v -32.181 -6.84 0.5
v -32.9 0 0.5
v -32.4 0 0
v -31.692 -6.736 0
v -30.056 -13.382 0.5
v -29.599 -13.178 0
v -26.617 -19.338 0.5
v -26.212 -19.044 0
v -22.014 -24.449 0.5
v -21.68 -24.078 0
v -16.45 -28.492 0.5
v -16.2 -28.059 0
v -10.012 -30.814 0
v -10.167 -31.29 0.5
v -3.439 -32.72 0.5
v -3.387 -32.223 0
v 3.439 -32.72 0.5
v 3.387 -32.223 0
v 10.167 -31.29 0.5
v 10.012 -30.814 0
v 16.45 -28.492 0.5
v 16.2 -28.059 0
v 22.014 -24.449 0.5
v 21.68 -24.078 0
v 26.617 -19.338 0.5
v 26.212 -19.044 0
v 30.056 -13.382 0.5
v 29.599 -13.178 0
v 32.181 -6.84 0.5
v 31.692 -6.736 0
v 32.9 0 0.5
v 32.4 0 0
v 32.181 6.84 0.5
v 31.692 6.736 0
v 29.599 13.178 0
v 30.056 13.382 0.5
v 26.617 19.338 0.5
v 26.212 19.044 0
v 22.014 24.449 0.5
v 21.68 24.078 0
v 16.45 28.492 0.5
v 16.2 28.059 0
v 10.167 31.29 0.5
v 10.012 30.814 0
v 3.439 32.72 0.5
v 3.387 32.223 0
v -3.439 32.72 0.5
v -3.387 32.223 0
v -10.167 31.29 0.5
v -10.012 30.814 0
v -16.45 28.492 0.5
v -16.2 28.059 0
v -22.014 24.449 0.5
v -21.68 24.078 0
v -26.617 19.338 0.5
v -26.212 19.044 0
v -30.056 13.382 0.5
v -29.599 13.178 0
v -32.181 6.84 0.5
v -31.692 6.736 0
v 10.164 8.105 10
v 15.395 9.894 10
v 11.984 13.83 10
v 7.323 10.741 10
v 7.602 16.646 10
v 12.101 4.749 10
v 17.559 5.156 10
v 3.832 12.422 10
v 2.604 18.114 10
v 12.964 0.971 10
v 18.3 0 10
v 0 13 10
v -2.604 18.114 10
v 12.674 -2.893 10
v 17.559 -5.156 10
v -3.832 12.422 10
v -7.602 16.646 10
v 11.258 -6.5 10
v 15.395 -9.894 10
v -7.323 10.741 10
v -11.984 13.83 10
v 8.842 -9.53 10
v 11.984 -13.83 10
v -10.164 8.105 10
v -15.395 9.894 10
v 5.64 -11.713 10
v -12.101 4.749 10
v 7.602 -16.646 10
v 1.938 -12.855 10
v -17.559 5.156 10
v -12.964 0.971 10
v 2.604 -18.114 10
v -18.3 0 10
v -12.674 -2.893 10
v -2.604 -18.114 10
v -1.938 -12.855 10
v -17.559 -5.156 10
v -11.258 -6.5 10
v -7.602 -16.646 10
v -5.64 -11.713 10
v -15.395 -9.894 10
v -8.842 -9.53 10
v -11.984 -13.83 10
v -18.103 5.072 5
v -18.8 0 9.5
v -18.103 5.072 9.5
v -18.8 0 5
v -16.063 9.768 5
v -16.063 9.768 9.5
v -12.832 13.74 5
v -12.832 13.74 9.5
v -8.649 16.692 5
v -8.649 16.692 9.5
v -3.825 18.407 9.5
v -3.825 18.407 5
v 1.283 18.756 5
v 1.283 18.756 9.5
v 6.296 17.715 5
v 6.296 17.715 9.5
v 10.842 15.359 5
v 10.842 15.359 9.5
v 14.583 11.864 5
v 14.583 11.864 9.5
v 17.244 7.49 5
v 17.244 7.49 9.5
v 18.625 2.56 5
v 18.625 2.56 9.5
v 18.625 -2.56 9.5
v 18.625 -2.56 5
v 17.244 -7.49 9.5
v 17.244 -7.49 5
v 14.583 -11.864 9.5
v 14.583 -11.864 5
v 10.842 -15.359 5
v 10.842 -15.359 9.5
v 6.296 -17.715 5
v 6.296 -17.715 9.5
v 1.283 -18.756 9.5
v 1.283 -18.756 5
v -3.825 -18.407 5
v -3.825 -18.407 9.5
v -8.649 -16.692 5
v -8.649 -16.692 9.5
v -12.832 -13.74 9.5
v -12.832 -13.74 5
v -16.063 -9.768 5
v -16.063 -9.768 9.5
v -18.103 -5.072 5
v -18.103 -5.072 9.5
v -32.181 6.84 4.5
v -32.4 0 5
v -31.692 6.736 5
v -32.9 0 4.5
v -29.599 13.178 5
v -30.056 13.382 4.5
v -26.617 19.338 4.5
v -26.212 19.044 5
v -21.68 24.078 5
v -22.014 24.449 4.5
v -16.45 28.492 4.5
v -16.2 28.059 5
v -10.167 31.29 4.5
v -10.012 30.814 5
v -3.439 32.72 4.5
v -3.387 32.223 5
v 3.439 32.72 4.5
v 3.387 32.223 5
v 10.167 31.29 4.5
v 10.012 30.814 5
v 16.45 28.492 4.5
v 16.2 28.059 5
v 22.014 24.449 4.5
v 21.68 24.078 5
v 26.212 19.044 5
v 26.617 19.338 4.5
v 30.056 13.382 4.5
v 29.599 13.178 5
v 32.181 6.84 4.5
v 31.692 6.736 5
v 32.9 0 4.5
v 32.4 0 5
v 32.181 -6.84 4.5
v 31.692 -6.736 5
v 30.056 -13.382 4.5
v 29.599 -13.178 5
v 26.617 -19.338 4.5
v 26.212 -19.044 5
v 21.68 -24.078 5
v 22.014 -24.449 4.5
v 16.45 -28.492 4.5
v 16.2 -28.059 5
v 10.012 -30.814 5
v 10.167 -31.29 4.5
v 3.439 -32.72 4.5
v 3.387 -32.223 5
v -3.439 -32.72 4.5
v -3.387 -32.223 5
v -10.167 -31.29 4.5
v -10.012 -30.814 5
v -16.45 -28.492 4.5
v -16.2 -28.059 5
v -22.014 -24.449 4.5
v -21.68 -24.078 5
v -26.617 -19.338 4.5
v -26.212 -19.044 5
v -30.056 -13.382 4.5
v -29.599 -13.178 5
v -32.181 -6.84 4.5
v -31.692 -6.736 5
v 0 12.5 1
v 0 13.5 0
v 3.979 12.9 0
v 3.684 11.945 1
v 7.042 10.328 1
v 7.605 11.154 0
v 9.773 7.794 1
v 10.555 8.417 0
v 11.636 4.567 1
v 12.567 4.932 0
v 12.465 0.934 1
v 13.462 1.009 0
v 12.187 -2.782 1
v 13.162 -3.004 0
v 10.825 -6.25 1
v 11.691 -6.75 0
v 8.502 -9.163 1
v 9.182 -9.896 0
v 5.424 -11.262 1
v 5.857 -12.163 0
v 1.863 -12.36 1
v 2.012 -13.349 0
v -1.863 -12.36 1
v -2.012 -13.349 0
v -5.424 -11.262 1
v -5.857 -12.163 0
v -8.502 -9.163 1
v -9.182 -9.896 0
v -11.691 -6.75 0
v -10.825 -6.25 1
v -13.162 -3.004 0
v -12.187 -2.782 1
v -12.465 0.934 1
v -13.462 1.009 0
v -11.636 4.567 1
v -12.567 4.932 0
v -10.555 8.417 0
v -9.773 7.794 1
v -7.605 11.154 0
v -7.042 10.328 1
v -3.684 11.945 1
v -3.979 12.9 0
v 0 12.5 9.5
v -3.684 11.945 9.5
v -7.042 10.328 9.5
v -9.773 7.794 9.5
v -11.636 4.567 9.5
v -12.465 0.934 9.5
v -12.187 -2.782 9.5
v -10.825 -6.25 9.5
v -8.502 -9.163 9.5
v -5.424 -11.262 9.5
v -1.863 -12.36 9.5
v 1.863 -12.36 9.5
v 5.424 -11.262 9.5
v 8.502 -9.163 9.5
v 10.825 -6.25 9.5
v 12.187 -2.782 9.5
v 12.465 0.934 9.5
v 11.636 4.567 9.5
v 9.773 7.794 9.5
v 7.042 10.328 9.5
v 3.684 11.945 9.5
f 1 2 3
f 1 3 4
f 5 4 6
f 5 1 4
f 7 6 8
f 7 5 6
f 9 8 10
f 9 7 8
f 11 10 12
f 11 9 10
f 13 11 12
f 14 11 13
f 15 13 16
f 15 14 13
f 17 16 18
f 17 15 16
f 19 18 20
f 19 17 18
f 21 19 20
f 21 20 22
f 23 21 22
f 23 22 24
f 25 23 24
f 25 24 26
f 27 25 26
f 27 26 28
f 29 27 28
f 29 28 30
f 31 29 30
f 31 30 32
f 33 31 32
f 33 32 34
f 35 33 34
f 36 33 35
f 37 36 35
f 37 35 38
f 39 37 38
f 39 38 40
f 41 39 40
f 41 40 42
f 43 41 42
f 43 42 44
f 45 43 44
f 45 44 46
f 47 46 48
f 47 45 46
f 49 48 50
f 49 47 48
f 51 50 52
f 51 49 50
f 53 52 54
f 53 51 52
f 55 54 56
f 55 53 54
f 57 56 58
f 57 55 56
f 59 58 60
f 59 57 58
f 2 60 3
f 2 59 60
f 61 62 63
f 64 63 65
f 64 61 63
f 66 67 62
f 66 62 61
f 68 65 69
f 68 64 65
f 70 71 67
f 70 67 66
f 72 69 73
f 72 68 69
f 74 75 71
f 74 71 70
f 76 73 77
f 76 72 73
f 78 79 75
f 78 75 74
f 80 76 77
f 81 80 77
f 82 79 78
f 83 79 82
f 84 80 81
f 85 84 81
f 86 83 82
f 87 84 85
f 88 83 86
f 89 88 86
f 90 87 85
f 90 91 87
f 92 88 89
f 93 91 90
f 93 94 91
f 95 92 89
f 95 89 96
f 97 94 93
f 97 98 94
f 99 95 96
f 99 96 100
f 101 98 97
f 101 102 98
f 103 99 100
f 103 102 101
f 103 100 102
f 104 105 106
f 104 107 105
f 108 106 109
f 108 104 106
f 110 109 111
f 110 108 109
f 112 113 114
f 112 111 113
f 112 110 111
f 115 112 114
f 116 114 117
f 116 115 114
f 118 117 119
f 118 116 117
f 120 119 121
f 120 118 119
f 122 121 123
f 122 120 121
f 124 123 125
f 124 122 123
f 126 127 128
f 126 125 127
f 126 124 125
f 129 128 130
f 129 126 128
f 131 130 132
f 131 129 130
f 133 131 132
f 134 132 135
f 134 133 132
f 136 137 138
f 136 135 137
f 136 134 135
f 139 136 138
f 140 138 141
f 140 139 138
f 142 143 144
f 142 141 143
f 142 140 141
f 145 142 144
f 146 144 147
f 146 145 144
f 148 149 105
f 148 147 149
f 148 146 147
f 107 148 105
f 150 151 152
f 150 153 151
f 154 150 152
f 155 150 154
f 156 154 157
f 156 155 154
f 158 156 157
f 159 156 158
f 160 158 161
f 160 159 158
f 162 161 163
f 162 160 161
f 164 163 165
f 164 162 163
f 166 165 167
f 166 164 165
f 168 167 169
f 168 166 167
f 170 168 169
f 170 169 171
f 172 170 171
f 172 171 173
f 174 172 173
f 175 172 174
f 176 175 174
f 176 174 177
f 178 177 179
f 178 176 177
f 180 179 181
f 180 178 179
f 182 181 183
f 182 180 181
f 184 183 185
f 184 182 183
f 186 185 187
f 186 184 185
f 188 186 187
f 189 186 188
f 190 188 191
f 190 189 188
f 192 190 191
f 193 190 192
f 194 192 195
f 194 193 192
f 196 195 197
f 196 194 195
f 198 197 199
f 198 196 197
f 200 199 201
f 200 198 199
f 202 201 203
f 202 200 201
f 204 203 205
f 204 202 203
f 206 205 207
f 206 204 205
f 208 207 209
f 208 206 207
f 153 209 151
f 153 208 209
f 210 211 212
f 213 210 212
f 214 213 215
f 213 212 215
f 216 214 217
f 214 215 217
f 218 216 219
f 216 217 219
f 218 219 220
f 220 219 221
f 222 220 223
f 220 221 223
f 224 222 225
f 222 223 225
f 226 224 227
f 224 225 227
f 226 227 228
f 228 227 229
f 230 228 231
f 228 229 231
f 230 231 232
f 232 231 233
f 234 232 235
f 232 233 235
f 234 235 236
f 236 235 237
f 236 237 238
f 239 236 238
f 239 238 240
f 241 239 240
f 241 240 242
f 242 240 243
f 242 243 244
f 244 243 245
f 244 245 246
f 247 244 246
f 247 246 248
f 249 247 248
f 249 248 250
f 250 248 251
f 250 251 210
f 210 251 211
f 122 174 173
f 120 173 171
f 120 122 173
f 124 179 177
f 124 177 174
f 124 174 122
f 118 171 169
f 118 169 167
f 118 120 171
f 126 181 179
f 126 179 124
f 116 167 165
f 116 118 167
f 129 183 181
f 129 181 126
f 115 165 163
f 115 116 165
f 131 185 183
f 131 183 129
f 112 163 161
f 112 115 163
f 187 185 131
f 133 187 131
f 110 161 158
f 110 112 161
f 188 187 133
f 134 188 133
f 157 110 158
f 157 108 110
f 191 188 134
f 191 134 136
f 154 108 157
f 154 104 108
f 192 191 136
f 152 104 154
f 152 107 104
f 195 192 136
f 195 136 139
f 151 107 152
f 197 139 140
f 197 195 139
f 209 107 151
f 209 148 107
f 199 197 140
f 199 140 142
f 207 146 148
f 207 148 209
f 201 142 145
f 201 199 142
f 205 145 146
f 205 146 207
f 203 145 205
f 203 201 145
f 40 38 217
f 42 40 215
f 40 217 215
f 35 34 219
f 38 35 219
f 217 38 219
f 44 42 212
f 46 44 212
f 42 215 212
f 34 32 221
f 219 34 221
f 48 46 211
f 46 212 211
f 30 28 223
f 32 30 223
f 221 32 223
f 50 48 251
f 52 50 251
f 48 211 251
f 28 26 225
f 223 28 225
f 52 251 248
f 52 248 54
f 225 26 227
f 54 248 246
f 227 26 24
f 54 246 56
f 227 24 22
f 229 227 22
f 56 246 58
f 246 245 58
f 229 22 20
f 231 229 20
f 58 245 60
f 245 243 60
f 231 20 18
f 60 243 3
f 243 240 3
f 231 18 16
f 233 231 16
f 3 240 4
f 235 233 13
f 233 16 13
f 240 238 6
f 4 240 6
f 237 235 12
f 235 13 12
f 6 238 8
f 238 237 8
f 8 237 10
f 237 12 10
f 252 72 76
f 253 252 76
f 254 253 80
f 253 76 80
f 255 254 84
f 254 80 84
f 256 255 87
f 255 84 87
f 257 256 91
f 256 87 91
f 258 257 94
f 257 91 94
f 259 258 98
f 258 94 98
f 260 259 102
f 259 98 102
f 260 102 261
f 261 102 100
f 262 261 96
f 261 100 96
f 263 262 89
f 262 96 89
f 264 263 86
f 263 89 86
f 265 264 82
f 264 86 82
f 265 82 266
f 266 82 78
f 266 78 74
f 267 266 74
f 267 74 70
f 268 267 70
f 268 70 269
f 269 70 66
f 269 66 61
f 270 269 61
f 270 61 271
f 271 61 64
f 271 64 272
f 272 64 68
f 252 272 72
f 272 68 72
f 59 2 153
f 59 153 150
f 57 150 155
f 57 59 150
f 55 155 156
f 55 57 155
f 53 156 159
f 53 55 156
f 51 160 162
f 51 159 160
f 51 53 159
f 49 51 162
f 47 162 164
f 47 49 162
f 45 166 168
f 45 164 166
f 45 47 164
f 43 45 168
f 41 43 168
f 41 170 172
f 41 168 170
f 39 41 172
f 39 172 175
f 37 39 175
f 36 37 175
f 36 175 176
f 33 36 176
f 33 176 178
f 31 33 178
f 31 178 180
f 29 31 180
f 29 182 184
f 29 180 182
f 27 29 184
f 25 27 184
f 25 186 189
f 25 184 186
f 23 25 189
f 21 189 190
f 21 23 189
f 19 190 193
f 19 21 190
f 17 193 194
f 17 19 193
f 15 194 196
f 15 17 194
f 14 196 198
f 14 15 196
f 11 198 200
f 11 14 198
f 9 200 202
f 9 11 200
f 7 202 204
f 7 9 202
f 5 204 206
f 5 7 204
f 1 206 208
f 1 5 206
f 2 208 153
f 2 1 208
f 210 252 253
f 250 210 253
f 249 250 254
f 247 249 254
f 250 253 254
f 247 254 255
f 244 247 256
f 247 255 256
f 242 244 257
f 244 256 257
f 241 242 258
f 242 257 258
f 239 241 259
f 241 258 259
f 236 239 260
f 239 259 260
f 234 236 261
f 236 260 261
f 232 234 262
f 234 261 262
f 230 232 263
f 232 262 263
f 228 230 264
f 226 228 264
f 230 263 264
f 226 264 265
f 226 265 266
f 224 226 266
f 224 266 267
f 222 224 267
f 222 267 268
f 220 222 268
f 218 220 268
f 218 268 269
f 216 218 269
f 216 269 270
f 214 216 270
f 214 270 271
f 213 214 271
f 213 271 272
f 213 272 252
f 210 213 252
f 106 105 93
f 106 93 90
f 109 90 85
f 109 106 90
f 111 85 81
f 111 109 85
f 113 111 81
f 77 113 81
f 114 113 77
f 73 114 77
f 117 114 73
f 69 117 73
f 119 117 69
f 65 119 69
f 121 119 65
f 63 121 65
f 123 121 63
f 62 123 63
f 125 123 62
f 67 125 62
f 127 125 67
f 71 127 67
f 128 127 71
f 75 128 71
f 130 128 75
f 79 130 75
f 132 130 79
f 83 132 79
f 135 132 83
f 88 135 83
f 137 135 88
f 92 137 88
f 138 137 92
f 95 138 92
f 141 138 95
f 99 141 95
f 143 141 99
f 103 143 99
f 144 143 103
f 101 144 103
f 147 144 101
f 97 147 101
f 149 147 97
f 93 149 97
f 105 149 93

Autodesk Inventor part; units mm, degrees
ref_plane "YZ Plane" through (0, 0, 0) normal (1, 0, 0) x (0, 1, 0)
ref_plane "XZ Plane" through (0, 0, 0) normal (0, 1, 0) x (-1, 0, 0)
ref_plane "XY Plane" through (0, 0, 0) normal (0, 0, 1) x (1, 0, 0)
sketch "Sketch1" plane through (0, 0, 0) normal (0, 1, 0) x (-1, 0, 0)
  line L0 (0, 0) -> (0, 10)
  line L1 (0, 10) -> (18.8, 10)
  line L2 (18.8, 10) -> (18.8, 5)
  line L3 (18.8, 5) -> (32.9, 5)
  line L4 (32.9, 5) -> (32.9, 0)
  line L5 (32.9, 0) -> (0, 0)
  dimension "d0" = 65.8
  dimension "d1" = 37.6
  dimension "d2" = 5
  dimension "d3" = 5
revolve "Revolution1" add sketch "Sketch1" angle 360 about axis through (0, 0, 0) along (0, 0, 1)
hole "Hole1" at (0, 0, 0) direction (0, 0, 1) diameter 25 end through all
chamfer "Chamfer1" distance 0.5 angle 45 4 edges at (32.9, 0, 0) (18.8, 0, 10) (32.9, 0, 5) (0, -12.5, 10)
chamfer "Chamfer2" distance 1 angle 45 1 edges at (0, -12.5, 0)
properties part number "Mesh-mounting-help" material "Nylon 6/6"
